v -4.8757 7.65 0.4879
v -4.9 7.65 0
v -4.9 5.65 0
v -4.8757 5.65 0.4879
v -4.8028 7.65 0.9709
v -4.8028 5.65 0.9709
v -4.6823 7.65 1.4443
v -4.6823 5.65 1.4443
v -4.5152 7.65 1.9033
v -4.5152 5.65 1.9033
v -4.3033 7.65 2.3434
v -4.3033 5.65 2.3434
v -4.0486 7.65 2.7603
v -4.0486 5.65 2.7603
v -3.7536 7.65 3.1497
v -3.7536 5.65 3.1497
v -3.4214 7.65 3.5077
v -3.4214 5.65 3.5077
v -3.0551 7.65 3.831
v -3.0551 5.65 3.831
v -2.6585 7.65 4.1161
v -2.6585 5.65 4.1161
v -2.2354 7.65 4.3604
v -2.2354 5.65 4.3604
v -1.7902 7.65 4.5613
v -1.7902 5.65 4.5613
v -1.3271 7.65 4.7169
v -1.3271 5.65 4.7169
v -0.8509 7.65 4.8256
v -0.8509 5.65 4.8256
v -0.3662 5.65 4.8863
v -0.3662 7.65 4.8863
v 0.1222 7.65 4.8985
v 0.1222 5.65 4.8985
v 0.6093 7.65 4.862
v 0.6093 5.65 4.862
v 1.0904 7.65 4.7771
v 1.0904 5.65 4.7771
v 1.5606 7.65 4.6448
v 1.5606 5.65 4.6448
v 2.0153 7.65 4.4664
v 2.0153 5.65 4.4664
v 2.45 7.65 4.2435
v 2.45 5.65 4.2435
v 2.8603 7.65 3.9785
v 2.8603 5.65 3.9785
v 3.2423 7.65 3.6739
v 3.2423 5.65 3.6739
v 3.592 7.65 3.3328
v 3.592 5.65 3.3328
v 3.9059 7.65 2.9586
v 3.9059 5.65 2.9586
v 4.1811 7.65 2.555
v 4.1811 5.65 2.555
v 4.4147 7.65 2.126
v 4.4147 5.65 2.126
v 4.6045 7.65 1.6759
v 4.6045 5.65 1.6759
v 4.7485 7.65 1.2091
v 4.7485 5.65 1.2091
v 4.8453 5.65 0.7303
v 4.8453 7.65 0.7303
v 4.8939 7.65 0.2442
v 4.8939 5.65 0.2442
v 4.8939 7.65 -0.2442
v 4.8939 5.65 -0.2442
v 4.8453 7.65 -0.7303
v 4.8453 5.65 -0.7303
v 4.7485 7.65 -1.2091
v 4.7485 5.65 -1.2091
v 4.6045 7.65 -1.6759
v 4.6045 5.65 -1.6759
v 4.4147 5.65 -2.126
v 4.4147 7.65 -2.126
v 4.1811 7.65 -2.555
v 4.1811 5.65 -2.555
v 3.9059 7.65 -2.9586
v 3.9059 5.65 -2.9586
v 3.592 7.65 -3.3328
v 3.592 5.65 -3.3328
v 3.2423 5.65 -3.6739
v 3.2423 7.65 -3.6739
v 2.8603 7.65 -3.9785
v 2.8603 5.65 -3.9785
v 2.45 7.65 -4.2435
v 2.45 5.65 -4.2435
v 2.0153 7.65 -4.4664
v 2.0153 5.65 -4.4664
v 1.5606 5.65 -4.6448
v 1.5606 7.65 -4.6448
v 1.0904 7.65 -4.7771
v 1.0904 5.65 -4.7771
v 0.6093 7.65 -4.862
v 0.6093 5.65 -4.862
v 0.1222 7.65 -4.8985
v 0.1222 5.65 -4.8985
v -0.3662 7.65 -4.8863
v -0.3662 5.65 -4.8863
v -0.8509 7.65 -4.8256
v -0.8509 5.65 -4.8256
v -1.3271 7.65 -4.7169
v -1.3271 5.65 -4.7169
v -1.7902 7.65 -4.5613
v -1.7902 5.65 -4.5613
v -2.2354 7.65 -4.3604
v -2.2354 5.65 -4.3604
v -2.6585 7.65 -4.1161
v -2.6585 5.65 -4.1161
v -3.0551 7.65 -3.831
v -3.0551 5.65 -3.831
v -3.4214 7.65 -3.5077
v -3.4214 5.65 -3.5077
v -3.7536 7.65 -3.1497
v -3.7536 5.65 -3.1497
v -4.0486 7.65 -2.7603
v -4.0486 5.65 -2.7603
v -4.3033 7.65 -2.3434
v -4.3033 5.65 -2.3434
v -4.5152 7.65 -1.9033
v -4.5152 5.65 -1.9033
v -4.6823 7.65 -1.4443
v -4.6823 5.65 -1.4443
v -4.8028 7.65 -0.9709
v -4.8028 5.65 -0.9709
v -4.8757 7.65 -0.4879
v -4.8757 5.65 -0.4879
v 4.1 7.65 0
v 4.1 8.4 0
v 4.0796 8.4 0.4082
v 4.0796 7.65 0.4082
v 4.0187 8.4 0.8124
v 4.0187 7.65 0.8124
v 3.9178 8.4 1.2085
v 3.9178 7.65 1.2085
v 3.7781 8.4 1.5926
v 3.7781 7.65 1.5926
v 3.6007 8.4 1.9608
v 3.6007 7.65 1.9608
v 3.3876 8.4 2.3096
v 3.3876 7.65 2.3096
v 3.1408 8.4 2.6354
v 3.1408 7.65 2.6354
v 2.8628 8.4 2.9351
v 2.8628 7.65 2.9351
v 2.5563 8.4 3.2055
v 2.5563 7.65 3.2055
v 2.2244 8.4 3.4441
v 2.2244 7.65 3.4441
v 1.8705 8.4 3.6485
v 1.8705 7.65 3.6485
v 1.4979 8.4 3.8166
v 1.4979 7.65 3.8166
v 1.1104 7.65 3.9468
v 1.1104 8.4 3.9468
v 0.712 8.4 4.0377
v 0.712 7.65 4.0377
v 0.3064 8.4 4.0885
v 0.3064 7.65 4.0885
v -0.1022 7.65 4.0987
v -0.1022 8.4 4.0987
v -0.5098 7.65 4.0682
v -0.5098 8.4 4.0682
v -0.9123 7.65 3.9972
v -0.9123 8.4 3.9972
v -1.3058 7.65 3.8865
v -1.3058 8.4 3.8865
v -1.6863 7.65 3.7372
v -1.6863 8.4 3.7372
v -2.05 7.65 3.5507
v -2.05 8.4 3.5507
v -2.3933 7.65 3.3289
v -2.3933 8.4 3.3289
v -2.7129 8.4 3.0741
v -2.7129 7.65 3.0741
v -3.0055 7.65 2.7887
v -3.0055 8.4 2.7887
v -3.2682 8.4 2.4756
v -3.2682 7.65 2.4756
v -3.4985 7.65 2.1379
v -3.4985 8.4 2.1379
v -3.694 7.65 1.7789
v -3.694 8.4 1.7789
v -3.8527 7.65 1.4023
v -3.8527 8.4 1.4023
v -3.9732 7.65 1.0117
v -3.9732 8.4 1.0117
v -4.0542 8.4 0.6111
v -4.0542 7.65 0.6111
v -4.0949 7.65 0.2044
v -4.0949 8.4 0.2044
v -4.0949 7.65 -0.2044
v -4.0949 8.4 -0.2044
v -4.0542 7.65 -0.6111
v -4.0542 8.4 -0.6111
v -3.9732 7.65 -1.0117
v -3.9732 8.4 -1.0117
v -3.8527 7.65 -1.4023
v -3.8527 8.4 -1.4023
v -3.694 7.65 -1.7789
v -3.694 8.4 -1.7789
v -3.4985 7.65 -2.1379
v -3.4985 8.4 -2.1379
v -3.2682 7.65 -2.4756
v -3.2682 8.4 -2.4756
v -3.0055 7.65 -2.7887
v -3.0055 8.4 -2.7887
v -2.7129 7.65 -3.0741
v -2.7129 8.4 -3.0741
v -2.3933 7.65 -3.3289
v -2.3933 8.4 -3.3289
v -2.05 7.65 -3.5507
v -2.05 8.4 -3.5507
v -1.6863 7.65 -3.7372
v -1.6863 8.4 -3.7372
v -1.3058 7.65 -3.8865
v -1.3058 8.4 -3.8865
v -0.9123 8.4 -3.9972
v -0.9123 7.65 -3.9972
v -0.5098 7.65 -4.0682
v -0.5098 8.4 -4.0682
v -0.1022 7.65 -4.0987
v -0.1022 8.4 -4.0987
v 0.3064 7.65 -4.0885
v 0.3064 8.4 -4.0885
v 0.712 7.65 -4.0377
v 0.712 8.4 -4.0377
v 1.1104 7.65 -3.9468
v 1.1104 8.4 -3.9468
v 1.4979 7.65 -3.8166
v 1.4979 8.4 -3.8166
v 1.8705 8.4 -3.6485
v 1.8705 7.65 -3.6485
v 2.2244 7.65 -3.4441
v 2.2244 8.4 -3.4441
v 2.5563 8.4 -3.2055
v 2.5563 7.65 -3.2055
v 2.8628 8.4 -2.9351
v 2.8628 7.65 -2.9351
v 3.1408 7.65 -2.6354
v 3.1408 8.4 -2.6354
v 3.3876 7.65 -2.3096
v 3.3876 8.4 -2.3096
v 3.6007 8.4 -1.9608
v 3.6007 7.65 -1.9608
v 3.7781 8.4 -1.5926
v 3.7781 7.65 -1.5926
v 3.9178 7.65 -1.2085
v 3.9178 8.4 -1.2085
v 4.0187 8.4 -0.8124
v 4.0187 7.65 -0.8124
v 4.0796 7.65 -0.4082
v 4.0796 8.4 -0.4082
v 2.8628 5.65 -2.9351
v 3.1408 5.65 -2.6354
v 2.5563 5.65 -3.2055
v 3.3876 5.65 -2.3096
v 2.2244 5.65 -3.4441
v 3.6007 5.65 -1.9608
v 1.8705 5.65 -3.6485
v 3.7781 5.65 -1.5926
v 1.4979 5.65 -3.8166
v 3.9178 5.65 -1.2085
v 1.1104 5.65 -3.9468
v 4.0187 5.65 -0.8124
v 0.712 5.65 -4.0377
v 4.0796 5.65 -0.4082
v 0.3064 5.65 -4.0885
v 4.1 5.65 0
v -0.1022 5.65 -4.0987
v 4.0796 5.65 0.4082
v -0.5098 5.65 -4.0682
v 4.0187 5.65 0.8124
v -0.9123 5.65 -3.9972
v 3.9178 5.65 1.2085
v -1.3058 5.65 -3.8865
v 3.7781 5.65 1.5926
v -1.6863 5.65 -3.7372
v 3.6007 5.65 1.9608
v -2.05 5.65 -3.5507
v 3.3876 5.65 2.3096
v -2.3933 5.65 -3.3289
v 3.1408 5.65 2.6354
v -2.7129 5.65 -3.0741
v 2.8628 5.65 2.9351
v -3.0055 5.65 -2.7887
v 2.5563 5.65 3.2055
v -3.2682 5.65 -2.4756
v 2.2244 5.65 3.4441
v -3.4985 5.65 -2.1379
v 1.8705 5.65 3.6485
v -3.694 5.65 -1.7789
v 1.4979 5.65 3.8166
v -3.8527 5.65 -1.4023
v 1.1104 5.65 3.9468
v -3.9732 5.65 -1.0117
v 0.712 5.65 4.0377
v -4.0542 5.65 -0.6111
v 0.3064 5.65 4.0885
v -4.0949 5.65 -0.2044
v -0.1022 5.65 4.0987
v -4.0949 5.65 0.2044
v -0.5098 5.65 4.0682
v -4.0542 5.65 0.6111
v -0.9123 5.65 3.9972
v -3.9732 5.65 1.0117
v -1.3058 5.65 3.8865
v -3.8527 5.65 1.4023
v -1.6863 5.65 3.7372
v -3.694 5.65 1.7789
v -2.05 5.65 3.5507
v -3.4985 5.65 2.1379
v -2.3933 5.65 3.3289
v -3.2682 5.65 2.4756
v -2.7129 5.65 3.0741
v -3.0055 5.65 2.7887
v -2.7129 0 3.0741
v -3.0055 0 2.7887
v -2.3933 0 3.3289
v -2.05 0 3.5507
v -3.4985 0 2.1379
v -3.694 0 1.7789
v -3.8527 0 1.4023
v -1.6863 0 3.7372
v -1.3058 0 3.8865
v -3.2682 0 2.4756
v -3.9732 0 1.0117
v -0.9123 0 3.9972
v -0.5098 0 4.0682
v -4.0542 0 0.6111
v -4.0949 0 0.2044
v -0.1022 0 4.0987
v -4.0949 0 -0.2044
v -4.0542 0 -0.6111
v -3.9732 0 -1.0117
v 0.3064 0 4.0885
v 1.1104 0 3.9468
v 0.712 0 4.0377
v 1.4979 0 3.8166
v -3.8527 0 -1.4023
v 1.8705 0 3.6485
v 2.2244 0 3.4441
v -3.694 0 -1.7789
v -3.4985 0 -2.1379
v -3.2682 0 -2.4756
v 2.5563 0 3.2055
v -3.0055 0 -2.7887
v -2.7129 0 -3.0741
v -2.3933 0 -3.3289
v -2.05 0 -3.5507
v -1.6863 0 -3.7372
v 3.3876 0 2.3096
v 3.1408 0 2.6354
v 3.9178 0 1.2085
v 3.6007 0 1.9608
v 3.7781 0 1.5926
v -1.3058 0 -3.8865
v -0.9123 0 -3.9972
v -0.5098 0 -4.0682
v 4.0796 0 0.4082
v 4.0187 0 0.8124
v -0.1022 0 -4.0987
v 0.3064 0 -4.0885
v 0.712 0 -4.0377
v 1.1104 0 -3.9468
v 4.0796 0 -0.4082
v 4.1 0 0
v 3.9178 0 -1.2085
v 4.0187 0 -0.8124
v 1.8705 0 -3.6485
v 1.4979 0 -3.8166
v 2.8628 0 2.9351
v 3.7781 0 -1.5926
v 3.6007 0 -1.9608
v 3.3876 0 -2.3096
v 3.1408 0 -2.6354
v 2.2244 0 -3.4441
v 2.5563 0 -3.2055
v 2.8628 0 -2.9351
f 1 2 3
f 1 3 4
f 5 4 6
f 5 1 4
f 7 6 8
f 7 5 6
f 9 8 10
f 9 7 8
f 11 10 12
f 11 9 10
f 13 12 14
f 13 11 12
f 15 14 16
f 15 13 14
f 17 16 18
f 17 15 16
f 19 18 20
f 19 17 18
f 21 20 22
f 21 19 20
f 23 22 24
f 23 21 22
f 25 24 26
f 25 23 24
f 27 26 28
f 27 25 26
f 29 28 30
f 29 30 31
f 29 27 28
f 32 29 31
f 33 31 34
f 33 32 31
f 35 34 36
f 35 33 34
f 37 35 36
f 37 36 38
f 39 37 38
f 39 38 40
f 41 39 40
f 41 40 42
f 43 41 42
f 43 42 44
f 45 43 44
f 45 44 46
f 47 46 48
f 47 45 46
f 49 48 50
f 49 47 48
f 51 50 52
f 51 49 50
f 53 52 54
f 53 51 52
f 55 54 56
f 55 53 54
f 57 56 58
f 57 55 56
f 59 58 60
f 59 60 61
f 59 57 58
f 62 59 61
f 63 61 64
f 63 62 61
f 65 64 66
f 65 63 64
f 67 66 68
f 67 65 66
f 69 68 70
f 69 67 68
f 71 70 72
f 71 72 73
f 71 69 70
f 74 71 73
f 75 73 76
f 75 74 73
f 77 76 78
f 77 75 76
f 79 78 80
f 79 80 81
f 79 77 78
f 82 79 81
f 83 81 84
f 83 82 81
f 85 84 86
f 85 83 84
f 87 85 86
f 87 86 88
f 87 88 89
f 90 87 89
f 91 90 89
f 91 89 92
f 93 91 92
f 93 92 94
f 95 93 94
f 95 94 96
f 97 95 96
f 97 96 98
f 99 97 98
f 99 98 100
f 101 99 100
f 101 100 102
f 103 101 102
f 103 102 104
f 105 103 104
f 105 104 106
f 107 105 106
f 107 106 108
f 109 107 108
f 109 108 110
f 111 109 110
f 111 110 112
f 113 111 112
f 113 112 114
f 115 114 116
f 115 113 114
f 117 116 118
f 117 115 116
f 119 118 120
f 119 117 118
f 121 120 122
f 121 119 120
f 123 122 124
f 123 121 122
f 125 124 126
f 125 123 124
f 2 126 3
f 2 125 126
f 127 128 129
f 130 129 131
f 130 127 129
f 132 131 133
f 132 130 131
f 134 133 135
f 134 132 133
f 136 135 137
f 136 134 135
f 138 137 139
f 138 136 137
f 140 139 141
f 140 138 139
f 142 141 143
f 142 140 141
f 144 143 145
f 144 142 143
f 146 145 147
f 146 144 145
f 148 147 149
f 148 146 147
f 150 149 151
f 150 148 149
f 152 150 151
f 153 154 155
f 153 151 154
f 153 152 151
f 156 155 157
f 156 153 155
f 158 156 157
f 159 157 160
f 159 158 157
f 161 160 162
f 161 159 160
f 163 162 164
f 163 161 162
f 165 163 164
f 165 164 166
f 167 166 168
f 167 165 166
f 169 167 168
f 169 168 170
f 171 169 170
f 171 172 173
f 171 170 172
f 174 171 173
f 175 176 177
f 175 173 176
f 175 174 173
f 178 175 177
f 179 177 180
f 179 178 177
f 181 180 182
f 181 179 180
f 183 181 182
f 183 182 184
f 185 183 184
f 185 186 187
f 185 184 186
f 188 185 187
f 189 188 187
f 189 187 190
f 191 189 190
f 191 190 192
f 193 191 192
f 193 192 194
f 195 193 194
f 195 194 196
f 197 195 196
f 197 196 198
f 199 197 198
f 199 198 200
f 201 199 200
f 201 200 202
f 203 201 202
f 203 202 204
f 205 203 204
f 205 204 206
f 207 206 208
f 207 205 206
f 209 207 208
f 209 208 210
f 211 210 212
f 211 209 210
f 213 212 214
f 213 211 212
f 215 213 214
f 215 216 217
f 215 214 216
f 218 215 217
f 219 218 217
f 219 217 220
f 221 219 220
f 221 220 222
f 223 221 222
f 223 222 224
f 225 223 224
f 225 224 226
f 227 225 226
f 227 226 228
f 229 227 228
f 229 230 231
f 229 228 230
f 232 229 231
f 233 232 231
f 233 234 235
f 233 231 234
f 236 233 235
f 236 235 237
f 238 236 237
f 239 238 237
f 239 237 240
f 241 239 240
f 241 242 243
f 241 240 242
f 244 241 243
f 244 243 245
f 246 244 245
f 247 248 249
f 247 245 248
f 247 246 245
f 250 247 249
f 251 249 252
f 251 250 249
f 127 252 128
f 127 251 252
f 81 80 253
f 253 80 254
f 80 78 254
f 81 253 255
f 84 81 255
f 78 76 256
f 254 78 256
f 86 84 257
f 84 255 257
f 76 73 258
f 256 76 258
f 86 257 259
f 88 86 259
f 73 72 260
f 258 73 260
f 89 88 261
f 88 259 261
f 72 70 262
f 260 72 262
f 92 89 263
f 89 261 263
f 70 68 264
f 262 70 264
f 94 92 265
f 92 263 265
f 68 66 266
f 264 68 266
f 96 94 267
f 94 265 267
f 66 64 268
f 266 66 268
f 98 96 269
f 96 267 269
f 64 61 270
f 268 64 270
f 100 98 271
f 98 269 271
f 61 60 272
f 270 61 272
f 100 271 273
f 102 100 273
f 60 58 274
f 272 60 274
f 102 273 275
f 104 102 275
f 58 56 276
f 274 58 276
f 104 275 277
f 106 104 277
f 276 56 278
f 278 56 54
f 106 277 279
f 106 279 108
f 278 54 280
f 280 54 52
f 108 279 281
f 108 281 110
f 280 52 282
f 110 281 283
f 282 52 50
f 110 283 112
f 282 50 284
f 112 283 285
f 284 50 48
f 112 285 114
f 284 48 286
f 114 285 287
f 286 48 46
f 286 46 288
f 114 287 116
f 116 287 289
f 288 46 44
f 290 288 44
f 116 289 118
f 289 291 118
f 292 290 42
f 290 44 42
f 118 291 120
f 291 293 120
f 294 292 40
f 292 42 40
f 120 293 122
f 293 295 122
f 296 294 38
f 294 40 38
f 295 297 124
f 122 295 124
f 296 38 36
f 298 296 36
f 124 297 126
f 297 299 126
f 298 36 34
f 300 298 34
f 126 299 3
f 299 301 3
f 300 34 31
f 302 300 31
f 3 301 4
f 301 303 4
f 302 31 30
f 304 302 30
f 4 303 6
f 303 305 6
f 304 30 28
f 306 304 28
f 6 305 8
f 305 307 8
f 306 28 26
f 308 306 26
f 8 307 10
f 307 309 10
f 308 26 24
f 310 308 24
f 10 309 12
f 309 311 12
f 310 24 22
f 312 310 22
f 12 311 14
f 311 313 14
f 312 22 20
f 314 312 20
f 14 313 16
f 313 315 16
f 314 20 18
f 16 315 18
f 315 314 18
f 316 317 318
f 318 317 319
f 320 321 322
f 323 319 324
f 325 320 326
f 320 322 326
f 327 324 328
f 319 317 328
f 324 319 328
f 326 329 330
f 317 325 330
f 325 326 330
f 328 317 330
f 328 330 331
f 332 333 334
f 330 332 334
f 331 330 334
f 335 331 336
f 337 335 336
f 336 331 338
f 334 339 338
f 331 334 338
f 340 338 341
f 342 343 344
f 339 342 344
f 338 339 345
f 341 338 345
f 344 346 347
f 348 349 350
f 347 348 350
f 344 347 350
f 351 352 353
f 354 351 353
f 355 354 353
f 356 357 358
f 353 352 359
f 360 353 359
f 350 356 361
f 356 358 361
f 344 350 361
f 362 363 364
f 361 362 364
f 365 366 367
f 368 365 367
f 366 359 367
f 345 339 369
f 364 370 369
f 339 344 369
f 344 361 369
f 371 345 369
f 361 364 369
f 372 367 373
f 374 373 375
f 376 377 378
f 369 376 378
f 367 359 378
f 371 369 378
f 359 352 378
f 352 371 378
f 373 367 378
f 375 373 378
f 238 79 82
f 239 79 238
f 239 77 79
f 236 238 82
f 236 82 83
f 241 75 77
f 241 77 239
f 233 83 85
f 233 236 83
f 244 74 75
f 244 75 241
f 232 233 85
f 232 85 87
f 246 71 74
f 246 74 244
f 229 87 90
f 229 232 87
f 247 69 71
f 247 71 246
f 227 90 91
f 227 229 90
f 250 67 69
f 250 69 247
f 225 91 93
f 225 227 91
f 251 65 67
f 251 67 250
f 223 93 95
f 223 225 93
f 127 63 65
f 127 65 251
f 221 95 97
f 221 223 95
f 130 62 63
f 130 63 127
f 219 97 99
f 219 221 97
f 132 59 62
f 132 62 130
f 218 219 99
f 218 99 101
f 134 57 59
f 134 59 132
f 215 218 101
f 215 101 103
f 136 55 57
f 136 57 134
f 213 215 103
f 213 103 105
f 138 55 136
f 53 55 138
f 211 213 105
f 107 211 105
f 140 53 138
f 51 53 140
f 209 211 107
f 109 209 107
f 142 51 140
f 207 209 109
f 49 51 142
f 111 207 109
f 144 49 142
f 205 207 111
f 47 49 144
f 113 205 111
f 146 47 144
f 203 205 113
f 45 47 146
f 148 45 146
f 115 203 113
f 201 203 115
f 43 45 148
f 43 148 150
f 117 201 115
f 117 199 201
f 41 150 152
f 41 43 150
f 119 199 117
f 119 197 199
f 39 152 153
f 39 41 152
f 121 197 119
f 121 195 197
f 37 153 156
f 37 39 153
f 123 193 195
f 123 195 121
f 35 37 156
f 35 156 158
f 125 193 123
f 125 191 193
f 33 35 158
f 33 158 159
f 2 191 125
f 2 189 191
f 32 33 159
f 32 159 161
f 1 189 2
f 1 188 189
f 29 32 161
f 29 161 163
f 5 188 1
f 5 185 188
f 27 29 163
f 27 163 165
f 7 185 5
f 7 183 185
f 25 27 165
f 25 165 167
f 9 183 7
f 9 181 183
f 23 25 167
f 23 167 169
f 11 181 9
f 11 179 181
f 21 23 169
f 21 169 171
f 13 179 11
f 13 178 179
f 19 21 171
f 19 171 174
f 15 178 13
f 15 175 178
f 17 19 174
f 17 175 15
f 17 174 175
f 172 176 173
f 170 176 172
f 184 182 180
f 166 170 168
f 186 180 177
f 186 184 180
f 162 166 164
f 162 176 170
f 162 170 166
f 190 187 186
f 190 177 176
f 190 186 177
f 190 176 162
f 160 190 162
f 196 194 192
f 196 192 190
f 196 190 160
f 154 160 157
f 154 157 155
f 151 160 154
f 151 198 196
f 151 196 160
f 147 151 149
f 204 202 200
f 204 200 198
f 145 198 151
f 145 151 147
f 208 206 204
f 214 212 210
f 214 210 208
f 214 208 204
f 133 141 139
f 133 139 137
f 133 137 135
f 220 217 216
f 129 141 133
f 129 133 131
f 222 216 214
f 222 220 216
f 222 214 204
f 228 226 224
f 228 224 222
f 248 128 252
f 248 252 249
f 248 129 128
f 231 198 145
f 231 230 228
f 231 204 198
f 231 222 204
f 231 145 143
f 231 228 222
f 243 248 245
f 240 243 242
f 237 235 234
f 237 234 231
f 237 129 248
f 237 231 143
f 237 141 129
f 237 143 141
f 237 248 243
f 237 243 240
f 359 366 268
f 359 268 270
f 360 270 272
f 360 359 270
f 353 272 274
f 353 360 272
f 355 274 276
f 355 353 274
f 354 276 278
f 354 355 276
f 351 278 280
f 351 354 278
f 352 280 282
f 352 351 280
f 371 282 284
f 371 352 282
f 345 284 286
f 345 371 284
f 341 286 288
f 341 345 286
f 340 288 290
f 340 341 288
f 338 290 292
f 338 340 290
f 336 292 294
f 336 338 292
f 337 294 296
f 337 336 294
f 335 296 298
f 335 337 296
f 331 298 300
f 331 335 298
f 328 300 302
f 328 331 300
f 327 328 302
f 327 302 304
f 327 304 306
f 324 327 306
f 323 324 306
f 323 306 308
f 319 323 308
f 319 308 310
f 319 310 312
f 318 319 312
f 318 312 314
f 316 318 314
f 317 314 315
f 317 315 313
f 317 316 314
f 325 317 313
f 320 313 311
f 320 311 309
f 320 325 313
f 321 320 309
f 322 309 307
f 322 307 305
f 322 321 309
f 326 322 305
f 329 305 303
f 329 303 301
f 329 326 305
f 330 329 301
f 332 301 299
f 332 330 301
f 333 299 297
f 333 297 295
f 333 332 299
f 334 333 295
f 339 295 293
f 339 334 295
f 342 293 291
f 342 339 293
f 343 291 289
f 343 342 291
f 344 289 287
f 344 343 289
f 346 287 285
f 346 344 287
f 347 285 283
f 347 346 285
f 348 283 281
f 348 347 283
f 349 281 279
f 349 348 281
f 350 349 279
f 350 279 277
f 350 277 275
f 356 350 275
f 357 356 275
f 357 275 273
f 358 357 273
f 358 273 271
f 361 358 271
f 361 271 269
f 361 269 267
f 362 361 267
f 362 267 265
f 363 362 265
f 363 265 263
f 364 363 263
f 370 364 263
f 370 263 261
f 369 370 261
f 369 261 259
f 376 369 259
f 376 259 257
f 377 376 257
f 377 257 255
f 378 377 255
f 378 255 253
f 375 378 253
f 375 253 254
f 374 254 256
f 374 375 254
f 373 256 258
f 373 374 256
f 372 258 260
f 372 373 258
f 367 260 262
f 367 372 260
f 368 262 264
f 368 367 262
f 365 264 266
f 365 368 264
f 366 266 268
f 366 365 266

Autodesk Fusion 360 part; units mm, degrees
sketch "Sketch1" plane through (0, 0, 0) normal (0, 1, 0) x (1, 0, 0)
  circle A0 centre (0, 0) radius 4.1
  dimension "d2" = 8.2
extrude "Extrude1" add sketch "Sketch1" along normal blind 8.4
sketch "Sketch2" plane through (0, 8.4, 0) normal (0, 1, 0) x (-1, 0, 0)
  circle A0 centre (0, 0) radius 4.1
  circle A1 centre (0, 0) radius 4.9
  dimension "d5" = 9.8
extrude "Extrude2" add sketch "Sketch2" against normal blind 2 from surface at -0.75
equation "d6 = -ActuatorDepth"
equation "ActuatorDepth = 0.75 mm" comment "Not in the drawing, so this is eyeballed"
